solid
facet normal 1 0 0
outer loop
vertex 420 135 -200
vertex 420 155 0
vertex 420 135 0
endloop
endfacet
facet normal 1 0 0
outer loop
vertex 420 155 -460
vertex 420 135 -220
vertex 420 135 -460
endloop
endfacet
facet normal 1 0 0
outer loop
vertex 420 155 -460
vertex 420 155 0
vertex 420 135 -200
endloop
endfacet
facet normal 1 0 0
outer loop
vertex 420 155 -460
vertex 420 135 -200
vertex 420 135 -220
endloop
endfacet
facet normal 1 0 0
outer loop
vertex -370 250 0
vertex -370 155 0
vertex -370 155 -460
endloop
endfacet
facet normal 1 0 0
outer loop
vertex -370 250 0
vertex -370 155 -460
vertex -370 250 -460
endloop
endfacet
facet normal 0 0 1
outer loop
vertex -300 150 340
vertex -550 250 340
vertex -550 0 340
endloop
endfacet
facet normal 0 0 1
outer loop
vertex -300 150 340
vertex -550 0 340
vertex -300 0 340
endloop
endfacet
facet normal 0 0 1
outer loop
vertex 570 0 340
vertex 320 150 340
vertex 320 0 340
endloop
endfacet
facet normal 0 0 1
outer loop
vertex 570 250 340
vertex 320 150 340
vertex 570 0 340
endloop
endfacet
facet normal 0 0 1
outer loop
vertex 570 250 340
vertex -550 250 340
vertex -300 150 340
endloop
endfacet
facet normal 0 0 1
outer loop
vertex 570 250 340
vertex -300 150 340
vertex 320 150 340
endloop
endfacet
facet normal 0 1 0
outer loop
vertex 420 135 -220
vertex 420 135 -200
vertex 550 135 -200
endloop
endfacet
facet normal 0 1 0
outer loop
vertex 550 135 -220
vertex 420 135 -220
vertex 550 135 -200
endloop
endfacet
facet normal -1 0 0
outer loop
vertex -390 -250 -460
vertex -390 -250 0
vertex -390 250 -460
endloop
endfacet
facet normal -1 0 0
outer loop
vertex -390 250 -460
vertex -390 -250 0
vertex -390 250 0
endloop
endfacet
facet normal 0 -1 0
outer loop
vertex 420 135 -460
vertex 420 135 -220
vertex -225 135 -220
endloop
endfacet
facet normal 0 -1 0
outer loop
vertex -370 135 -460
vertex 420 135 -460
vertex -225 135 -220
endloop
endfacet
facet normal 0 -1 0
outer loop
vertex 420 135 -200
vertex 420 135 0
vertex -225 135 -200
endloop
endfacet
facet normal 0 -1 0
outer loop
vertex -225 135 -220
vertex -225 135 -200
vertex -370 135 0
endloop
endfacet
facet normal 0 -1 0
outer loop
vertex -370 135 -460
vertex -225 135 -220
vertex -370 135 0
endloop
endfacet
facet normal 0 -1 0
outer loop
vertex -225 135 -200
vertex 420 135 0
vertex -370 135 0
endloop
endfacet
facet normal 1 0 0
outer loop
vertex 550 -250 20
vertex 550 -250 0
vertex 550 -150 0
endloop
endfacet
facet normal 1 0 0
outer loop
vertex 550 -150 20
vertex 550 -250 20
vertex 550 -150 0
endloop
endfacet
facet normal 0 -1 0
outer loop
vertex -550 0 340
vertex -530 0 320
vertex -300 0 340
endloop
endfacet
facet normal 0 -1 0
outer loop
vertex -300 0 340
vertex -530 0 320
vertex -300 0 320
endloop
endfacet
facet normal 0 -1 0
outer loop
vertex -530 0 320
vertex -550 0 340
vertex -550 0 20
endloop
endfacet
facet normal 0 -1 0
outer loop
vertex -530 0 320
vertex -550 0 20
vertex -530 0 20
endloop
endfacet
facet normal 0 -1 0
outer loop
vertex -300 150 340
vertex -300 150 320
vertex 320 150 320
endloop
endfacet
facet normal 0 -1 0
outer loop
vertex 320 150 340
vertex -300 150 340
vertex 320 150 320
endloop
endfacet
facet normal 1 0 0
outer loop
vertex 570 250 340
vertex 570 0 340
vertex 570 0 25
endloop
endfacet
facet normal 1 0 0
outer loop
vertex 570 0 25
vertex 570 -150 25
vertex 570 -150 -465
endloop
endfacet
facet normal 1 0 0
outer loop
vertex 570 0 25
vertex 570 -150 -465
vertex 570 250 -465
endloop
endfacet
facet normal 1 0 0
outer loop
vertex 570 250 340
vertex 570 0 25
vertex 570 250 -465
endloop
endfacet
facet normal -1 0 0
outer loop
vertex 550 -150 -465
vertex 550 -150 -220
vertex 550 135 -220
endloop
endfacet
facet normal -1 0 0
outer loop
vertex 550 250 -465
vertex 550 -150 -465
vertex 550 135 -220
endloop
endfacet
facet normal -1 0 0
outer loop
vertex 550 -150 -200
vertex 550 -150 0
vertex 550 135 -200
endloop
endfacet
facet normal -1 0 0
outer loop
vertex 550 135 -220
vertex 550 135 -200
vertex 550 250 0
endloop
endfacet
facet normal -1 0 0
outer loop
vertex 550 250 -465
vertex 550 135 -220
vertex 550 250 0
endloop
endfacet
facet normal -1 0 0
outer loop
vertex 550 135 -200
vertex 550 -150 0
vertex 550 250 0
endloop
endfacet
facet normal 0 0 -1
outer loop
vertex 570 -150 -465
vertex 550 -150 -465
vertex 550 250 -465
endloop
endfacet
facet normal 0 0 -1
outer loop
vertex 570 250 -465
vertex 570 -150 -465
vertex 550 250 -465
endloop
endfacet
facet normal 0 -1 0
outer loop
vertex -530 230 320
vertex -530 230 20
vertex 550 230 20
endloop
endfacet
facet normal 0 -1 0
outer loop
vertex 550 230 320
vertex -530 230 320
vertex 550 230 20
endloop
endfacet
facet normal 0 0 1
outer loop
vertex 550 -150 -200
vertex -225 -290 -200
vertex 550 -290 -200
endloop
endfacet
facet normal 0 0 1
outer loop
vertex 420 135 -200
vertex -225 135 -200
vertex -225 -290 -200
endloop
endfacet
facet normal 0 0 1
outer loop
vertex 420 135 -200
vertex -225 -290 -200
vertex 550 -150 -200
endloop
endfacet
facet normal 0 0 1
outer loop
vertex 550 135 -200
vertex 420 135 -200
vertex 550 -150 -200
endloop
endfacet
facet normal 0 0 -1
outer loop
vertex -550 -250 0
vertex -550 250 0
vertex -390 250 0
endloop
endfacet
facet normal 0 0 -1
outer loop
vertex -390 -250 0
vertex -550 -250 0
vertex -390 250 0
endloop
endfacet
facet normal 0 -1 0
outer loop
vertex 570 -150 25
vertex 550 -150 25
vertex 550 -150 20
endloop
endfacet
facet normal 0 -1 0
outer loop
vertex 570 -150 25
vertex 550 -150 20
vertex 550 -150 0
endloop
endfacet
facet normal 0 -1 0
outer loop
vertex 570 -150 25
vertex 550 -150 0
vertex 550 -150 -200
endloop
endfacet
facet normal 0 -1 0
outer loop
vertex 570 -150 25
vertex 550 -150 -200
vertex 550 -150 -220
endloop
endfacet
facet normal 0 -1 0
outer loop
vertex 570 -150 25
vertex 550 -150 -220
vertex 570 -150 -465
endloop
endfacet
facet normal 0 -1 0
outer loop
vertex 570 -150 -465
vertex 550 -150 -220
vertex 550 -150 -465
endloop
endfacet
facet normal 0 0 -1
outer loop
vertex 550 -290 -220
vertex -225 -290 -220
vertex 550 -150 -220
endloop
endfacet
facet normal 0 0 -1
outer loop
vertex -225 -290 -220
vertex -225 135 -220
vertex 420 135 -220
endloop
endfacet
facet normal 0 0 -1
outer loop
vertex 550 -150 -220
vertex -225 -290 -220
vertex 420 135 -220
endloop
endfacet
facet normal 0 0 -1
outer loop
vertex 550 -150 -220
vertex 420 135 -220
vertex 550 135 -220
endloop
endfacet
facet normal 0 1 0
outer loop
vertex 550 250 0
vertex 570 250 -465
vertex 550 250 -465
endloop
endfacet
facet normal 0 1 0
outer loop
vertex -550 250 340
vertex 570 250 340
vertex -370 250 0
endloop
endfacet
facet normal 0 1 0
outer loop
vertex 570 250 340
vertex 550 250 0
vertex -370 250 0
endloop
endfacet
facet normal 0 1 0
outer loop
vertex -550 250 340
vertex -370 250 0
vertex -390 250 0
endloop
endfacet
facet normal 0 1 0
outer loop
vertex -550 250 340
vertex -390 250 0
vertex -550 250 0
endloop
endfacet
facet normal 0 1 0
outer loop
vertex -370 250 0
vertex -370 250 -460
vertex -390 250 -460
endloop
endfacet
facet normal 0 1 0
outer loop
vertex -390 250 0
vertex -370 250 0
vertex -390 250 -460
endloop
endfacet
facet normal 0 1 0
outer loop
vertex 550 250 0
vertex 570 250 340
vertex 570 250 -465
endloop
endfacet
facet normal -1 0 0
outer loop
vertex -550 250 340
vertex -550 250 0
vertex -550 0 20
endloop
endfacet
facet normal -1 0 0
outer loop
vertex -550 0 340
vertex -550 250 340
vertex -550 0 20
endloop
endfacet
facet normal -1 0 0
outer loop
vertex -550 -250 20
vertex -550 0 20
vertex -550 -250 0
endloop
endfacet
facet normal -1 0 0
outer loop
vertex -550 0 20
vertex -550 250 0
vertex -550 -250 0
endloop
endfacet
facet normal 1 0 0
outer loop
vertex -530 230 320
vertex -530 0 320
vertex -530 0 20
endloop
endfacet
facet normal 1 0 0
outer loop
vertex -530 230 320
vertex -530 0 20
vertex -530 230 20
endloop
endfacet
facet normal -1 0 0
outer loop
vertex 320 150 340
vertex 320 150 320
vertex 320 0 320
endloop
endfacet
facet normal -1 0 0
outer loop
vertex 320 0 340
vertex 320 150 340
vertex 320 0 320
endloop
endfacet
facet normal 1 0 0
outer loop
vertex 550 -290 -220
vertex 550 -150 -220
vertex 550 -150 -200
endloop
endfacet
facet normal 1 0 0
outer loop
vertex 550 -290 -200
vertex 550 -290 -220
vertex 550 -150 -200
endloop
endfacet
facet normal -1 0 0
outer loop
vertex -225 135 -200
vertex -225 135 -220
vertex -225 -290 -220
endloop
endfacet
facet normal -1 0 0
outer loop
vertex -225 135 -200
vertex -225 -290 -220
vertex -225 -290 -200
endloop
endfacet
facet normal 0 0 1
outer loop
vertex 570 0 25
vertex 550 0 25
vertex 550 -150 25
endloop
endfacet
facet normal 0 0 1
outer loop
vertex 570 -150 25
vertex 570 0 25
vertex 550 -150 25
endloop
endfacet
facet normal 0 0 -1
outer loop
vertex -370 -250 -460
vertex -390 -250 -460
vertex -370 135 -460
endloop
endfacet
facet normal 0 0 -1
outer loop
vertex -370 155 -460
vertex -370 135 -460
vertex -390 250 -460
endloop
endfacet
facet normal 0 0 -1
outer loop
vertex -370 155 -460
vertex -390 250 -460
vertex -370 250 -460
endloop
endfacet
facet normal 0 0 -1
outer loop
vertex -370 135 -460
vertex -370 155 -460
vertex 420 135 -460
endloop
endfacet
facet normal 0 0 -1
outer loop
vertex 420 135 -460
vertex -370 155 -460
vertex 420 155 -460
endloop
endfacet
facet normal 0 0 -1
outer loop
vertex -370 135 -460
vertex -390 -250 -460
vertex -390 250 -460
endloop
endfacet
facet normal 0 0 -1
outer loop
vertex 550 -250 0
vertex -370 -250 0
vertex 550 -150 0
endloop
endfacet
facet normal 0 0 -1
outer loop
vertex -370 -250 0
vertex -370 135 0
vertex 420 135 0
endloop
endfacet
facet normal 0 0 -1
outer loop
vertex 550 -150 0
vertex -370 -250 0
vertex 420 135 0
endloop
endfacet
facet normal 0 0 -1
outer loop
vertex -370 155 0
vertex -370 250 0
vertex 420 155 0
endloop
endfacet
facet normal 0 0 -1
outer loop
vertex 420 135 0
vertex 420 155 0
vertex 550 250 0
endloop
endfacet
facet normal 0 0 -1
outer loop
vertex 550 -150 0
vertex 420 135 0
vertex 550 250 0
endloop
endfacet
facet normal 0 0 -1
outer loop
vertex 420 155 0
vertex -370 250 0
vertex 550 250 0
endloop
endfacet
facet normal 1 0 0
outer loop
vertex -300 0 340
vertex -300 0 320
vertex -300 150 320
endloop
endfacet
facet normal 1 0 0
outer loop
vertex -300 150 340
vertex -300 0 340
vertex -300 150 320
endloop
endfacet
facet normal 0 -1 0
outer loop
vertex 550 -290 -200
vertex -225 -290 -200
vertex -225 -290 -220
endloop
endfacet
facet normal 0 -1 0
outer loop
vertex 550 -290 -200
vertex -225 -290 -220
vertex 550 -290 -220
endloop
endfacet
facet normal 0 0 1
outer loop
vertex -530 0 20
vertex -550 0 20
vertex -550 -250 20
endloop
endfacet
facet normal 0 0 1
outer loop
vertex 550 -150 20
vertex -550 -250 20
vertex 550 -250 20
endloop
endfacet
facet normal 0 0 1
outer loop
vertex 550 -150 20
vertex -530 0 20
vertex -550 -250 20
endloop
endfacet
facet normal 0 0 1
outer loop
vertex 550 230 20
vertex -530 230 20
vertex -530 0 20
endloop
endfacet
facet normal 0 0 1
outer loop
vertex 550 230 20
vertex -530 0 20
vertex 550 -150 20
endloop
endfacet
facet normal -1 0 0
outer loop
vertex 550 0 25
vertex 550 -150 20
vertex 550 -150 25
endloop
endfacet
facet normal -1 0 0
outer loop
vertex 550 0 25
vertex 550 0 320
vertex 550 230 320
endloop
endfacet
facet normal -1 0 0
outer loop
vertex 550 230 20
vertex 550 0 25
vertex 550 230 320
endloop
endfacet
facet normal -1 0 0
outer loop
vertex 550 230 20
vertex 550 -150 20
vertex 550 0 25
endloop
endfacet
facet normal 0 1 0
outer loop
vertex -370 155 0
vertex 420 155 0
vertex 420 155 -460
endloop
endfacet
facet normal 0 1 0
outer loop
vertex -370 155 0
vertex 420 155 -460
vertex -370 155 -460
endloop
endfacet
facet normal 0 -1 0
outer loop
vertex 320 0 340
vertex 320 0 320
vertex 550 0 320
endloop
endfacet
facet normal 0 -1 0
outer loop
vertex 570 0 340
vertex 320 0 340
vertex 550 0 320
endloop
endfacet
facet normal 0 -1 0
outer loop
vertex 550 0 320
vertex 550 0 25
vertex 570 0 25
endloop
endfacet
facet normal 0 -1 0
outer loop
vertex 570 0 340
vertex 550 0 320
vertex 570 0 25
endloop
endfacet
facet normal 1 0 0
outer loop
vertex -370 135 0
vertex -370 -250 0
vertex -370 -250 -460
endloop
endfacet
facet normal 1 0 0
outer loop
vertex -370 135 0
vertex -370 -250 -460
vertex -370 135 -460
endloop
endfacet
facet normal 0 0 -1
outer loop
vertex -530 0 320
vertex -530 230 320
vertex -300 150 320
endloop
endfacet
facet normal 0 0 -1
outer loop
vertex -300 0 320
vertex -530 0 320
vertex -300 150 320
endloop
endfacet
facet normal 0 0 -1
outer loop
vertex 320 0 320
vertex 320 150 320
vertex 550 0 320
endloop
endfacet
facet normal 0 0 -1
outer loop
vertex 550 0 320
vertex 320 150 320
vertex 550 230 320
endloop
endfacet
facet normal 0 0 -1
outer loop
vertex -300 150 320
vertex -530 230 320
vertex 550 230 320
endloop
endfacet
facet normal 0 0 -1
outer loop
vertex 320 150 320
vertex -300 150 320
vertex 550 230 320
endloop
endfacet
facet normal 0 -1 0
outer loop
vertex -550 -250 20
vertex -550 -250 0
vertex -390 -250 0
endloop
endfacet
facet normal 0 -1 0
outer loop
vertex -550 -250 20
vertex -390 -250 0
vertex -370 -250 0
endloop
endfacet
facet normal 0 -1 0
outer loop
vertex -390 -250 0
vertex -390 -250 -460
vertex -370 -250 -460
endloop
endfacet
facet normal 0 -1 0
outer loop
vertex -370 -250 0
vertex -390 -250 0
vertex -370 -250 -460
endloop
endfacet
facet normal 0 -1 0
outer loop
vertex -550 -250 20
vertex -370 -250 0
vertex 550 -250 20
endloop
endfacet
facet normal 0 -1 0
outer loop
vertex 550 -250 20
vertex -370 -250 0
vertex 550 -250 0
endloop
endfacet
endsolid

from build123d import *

# Parameters (mm, degrees)
F0_W      = 1100
F0_H      = 500
F1_DEPTH  = 20
F4_DEPTH  = 20
F5_W      = 20
F5_H      = 500
F6_DEPTH  = 460
F9_DEPTH  = 20
F10_W     = 775
F10_H     = 20
F11_DEPTH = 425
F12_W     = 1100
F12_H     = 20
F13_DEPTH = 300
F14_W     = 20
F14_H     = 230
F15_DEPTH = 300
F16_W     = 20
F16_H     = 250
F17_DEPTH = 295
F19_DEPTH = 20
F20_DEPTH = 20


with BuildPart() as f1:
    # F0 (on Top) → F1 (new body)
    with BuildSketch(Plane.XY):
        Rectangle(F0_W, F0_H)
    extrude(amount=F1_DEPTH)

    # F3 (on offset) → F4 (join)
    with BuildSketch(Plane.YZ.offset(550)):
        Polygon((250, -465), (250, 0), (250, 25), (-150, 25), (-150, -465), align=None)
    extrude(amount=F4_DEPTH)

    # F5 (on face) → F6 (join)
    with BuildSketch(Plane.XY):
        with Locations((-380, 0)):
            Rectangle(F5_W, F5_H)
    extrude(amount=-F6_DEPTH)

    # F8 (on offset) → F9 (join)
    with BuildSketch(Plane(origin=(0, 155, 0), x_dir=(-1, 0, 0), z_dir=(0, 1, 0))):
        Polygon((370, 0), (0, 0), (-420, 0), (-420, -460), (370, -460), align=None)
    extrude(amount=-F9_DEPTH)

    # F10 (on face) → F11 (join)
    with BuildSketch(Plane.XZ.offset(-135)):
        with Locations((162.5, -210)):
            Rectangle(F10_W, F10_H)
    extrude(amount=F11_DEPTH)

    # F12 (on face) → F13 (join)
    with BuildSketch(Plane.XY.offset(20)):
        with Locations((0, 240)):
            Rectangle(F12_W, F12_H)
    extrude(amount=F13_DEPTH)

    # F14 (on face) → F15 (join)
    with BuildSketch(Plane.XY.offset(20)):
        with Locations((-540, 115)):
            Rectangle(F14_W, F14_H)
    extrude(amount=F15_DEPTH)

    # F16 (on face) → F17 (join)
    with BuildSketch(Plane.XY.offset(25)):
        with Locations((560, 125)):
            Rectangle(F16_W, F16_H)
    extrude(amount=F17_DEPTH)

    # F18 (on face) → F19 (join)
    with BuildSketch(Plane.XY.offset(320)):
        Polygon((-300, 250), (-550, 250), (-550, 0), (-300, 0), (-300, 150), (320, 150), (320, 0), (570, 0), (570, 250), (320, 250), align=None)
    extrude(amount=F19_DEPTH)

    # F18 (on face) → F20 (join)
    with BuildSketch(Plane.XY.offset(320)):
        Polygon((-300, 250), (-550, 250), (-550, 0), (-300, 0), (-300, 150), (320, 150), (320, 0), (570, 0), (570, 250), (320, 250), align=None)
    extrude(amount=F20_DEPTH)


solid = f1.part
